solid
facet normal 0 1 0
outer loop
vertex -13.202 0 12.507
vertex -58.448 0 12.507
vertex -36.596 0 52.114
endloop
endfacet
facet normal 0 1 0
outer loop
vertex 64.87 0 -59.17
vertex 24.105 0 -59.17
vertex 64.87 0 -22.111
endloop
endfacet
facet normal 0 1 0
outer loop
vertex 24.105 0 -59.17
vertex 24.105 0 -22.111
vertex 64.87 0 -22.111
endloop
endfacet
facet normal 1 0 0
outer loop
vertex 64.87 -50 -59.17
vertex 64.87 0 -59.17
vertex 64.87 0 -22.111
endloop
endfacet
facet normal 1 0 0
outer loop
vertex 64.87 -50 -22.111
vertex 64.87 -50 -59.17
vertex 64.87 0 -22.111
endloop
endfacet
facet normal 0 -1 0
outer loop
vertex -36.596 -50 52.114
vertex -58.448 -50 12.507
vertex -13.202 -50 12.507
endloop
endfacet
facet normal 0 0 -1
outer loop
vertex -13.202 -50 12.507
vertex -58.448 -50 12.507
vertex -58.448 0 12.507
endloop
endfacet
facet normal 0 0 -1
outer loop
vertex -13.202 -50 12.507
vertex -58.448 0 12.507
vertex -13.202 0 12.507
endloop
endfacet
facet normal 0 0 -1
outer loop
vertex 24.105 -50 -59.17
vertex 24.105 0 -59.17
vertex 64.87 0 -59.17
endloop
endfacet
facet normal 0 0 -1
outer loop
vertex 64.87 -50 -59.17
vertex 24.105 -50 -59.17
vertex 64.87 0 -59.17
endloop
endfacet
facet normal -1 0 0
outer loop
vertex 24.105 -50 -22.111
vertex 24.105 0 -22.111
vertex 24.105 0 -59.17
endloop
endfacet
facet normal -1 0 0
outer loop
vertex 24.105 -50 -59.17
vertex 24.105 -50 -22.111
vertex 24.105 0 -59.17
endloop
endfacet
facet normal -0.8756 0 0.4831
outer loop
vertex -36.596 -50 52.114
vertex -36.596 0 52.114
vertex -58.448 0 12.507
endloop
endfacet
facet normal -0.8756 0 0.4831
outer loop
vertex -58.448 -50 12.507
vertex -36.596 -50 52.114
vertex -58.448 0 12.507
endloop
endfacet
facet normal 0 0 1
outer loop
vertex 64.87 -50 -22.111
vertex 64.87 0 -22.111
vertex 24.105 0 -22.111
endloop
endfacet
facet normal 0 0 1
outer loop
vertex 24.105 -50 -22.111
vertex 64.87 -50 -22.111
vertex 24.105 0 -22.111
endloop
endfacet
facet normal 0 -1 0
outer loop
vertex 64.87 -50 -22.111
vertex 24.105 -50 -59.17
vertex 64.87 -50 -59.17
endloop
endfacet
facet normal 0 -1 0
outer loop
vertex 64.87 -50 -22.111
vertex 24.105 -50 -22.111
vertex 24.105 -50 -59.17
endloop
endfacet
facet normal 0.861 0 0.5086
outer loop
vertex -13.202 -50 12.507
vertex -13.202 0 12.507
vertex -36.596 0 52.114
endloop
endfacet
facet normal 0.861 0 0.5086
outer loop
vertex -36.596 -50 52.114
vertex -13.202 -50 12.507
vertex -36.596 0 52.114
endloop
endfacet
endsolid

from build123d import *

# Parameters (mm, degrees)
F1_DEPTH = 50


with BuildPart() as f1:
    # F0 (on Front) → F1 (new body)
    with BuildSketch(Plane.XZ):
        Polygon((-36.59559, 52.113969), (-58.447516, 12.507354), (-13.202207, 12.507354), align=None)
        Polygon((24.105245, -59.169795), (64.869953, -59.169795), (64.869953, -22.110971), (58.847902, -22.110971), (24.105245, -22.110971), align=None)
    extrude(amount=F1_DEPTH)


solid = f1.part
